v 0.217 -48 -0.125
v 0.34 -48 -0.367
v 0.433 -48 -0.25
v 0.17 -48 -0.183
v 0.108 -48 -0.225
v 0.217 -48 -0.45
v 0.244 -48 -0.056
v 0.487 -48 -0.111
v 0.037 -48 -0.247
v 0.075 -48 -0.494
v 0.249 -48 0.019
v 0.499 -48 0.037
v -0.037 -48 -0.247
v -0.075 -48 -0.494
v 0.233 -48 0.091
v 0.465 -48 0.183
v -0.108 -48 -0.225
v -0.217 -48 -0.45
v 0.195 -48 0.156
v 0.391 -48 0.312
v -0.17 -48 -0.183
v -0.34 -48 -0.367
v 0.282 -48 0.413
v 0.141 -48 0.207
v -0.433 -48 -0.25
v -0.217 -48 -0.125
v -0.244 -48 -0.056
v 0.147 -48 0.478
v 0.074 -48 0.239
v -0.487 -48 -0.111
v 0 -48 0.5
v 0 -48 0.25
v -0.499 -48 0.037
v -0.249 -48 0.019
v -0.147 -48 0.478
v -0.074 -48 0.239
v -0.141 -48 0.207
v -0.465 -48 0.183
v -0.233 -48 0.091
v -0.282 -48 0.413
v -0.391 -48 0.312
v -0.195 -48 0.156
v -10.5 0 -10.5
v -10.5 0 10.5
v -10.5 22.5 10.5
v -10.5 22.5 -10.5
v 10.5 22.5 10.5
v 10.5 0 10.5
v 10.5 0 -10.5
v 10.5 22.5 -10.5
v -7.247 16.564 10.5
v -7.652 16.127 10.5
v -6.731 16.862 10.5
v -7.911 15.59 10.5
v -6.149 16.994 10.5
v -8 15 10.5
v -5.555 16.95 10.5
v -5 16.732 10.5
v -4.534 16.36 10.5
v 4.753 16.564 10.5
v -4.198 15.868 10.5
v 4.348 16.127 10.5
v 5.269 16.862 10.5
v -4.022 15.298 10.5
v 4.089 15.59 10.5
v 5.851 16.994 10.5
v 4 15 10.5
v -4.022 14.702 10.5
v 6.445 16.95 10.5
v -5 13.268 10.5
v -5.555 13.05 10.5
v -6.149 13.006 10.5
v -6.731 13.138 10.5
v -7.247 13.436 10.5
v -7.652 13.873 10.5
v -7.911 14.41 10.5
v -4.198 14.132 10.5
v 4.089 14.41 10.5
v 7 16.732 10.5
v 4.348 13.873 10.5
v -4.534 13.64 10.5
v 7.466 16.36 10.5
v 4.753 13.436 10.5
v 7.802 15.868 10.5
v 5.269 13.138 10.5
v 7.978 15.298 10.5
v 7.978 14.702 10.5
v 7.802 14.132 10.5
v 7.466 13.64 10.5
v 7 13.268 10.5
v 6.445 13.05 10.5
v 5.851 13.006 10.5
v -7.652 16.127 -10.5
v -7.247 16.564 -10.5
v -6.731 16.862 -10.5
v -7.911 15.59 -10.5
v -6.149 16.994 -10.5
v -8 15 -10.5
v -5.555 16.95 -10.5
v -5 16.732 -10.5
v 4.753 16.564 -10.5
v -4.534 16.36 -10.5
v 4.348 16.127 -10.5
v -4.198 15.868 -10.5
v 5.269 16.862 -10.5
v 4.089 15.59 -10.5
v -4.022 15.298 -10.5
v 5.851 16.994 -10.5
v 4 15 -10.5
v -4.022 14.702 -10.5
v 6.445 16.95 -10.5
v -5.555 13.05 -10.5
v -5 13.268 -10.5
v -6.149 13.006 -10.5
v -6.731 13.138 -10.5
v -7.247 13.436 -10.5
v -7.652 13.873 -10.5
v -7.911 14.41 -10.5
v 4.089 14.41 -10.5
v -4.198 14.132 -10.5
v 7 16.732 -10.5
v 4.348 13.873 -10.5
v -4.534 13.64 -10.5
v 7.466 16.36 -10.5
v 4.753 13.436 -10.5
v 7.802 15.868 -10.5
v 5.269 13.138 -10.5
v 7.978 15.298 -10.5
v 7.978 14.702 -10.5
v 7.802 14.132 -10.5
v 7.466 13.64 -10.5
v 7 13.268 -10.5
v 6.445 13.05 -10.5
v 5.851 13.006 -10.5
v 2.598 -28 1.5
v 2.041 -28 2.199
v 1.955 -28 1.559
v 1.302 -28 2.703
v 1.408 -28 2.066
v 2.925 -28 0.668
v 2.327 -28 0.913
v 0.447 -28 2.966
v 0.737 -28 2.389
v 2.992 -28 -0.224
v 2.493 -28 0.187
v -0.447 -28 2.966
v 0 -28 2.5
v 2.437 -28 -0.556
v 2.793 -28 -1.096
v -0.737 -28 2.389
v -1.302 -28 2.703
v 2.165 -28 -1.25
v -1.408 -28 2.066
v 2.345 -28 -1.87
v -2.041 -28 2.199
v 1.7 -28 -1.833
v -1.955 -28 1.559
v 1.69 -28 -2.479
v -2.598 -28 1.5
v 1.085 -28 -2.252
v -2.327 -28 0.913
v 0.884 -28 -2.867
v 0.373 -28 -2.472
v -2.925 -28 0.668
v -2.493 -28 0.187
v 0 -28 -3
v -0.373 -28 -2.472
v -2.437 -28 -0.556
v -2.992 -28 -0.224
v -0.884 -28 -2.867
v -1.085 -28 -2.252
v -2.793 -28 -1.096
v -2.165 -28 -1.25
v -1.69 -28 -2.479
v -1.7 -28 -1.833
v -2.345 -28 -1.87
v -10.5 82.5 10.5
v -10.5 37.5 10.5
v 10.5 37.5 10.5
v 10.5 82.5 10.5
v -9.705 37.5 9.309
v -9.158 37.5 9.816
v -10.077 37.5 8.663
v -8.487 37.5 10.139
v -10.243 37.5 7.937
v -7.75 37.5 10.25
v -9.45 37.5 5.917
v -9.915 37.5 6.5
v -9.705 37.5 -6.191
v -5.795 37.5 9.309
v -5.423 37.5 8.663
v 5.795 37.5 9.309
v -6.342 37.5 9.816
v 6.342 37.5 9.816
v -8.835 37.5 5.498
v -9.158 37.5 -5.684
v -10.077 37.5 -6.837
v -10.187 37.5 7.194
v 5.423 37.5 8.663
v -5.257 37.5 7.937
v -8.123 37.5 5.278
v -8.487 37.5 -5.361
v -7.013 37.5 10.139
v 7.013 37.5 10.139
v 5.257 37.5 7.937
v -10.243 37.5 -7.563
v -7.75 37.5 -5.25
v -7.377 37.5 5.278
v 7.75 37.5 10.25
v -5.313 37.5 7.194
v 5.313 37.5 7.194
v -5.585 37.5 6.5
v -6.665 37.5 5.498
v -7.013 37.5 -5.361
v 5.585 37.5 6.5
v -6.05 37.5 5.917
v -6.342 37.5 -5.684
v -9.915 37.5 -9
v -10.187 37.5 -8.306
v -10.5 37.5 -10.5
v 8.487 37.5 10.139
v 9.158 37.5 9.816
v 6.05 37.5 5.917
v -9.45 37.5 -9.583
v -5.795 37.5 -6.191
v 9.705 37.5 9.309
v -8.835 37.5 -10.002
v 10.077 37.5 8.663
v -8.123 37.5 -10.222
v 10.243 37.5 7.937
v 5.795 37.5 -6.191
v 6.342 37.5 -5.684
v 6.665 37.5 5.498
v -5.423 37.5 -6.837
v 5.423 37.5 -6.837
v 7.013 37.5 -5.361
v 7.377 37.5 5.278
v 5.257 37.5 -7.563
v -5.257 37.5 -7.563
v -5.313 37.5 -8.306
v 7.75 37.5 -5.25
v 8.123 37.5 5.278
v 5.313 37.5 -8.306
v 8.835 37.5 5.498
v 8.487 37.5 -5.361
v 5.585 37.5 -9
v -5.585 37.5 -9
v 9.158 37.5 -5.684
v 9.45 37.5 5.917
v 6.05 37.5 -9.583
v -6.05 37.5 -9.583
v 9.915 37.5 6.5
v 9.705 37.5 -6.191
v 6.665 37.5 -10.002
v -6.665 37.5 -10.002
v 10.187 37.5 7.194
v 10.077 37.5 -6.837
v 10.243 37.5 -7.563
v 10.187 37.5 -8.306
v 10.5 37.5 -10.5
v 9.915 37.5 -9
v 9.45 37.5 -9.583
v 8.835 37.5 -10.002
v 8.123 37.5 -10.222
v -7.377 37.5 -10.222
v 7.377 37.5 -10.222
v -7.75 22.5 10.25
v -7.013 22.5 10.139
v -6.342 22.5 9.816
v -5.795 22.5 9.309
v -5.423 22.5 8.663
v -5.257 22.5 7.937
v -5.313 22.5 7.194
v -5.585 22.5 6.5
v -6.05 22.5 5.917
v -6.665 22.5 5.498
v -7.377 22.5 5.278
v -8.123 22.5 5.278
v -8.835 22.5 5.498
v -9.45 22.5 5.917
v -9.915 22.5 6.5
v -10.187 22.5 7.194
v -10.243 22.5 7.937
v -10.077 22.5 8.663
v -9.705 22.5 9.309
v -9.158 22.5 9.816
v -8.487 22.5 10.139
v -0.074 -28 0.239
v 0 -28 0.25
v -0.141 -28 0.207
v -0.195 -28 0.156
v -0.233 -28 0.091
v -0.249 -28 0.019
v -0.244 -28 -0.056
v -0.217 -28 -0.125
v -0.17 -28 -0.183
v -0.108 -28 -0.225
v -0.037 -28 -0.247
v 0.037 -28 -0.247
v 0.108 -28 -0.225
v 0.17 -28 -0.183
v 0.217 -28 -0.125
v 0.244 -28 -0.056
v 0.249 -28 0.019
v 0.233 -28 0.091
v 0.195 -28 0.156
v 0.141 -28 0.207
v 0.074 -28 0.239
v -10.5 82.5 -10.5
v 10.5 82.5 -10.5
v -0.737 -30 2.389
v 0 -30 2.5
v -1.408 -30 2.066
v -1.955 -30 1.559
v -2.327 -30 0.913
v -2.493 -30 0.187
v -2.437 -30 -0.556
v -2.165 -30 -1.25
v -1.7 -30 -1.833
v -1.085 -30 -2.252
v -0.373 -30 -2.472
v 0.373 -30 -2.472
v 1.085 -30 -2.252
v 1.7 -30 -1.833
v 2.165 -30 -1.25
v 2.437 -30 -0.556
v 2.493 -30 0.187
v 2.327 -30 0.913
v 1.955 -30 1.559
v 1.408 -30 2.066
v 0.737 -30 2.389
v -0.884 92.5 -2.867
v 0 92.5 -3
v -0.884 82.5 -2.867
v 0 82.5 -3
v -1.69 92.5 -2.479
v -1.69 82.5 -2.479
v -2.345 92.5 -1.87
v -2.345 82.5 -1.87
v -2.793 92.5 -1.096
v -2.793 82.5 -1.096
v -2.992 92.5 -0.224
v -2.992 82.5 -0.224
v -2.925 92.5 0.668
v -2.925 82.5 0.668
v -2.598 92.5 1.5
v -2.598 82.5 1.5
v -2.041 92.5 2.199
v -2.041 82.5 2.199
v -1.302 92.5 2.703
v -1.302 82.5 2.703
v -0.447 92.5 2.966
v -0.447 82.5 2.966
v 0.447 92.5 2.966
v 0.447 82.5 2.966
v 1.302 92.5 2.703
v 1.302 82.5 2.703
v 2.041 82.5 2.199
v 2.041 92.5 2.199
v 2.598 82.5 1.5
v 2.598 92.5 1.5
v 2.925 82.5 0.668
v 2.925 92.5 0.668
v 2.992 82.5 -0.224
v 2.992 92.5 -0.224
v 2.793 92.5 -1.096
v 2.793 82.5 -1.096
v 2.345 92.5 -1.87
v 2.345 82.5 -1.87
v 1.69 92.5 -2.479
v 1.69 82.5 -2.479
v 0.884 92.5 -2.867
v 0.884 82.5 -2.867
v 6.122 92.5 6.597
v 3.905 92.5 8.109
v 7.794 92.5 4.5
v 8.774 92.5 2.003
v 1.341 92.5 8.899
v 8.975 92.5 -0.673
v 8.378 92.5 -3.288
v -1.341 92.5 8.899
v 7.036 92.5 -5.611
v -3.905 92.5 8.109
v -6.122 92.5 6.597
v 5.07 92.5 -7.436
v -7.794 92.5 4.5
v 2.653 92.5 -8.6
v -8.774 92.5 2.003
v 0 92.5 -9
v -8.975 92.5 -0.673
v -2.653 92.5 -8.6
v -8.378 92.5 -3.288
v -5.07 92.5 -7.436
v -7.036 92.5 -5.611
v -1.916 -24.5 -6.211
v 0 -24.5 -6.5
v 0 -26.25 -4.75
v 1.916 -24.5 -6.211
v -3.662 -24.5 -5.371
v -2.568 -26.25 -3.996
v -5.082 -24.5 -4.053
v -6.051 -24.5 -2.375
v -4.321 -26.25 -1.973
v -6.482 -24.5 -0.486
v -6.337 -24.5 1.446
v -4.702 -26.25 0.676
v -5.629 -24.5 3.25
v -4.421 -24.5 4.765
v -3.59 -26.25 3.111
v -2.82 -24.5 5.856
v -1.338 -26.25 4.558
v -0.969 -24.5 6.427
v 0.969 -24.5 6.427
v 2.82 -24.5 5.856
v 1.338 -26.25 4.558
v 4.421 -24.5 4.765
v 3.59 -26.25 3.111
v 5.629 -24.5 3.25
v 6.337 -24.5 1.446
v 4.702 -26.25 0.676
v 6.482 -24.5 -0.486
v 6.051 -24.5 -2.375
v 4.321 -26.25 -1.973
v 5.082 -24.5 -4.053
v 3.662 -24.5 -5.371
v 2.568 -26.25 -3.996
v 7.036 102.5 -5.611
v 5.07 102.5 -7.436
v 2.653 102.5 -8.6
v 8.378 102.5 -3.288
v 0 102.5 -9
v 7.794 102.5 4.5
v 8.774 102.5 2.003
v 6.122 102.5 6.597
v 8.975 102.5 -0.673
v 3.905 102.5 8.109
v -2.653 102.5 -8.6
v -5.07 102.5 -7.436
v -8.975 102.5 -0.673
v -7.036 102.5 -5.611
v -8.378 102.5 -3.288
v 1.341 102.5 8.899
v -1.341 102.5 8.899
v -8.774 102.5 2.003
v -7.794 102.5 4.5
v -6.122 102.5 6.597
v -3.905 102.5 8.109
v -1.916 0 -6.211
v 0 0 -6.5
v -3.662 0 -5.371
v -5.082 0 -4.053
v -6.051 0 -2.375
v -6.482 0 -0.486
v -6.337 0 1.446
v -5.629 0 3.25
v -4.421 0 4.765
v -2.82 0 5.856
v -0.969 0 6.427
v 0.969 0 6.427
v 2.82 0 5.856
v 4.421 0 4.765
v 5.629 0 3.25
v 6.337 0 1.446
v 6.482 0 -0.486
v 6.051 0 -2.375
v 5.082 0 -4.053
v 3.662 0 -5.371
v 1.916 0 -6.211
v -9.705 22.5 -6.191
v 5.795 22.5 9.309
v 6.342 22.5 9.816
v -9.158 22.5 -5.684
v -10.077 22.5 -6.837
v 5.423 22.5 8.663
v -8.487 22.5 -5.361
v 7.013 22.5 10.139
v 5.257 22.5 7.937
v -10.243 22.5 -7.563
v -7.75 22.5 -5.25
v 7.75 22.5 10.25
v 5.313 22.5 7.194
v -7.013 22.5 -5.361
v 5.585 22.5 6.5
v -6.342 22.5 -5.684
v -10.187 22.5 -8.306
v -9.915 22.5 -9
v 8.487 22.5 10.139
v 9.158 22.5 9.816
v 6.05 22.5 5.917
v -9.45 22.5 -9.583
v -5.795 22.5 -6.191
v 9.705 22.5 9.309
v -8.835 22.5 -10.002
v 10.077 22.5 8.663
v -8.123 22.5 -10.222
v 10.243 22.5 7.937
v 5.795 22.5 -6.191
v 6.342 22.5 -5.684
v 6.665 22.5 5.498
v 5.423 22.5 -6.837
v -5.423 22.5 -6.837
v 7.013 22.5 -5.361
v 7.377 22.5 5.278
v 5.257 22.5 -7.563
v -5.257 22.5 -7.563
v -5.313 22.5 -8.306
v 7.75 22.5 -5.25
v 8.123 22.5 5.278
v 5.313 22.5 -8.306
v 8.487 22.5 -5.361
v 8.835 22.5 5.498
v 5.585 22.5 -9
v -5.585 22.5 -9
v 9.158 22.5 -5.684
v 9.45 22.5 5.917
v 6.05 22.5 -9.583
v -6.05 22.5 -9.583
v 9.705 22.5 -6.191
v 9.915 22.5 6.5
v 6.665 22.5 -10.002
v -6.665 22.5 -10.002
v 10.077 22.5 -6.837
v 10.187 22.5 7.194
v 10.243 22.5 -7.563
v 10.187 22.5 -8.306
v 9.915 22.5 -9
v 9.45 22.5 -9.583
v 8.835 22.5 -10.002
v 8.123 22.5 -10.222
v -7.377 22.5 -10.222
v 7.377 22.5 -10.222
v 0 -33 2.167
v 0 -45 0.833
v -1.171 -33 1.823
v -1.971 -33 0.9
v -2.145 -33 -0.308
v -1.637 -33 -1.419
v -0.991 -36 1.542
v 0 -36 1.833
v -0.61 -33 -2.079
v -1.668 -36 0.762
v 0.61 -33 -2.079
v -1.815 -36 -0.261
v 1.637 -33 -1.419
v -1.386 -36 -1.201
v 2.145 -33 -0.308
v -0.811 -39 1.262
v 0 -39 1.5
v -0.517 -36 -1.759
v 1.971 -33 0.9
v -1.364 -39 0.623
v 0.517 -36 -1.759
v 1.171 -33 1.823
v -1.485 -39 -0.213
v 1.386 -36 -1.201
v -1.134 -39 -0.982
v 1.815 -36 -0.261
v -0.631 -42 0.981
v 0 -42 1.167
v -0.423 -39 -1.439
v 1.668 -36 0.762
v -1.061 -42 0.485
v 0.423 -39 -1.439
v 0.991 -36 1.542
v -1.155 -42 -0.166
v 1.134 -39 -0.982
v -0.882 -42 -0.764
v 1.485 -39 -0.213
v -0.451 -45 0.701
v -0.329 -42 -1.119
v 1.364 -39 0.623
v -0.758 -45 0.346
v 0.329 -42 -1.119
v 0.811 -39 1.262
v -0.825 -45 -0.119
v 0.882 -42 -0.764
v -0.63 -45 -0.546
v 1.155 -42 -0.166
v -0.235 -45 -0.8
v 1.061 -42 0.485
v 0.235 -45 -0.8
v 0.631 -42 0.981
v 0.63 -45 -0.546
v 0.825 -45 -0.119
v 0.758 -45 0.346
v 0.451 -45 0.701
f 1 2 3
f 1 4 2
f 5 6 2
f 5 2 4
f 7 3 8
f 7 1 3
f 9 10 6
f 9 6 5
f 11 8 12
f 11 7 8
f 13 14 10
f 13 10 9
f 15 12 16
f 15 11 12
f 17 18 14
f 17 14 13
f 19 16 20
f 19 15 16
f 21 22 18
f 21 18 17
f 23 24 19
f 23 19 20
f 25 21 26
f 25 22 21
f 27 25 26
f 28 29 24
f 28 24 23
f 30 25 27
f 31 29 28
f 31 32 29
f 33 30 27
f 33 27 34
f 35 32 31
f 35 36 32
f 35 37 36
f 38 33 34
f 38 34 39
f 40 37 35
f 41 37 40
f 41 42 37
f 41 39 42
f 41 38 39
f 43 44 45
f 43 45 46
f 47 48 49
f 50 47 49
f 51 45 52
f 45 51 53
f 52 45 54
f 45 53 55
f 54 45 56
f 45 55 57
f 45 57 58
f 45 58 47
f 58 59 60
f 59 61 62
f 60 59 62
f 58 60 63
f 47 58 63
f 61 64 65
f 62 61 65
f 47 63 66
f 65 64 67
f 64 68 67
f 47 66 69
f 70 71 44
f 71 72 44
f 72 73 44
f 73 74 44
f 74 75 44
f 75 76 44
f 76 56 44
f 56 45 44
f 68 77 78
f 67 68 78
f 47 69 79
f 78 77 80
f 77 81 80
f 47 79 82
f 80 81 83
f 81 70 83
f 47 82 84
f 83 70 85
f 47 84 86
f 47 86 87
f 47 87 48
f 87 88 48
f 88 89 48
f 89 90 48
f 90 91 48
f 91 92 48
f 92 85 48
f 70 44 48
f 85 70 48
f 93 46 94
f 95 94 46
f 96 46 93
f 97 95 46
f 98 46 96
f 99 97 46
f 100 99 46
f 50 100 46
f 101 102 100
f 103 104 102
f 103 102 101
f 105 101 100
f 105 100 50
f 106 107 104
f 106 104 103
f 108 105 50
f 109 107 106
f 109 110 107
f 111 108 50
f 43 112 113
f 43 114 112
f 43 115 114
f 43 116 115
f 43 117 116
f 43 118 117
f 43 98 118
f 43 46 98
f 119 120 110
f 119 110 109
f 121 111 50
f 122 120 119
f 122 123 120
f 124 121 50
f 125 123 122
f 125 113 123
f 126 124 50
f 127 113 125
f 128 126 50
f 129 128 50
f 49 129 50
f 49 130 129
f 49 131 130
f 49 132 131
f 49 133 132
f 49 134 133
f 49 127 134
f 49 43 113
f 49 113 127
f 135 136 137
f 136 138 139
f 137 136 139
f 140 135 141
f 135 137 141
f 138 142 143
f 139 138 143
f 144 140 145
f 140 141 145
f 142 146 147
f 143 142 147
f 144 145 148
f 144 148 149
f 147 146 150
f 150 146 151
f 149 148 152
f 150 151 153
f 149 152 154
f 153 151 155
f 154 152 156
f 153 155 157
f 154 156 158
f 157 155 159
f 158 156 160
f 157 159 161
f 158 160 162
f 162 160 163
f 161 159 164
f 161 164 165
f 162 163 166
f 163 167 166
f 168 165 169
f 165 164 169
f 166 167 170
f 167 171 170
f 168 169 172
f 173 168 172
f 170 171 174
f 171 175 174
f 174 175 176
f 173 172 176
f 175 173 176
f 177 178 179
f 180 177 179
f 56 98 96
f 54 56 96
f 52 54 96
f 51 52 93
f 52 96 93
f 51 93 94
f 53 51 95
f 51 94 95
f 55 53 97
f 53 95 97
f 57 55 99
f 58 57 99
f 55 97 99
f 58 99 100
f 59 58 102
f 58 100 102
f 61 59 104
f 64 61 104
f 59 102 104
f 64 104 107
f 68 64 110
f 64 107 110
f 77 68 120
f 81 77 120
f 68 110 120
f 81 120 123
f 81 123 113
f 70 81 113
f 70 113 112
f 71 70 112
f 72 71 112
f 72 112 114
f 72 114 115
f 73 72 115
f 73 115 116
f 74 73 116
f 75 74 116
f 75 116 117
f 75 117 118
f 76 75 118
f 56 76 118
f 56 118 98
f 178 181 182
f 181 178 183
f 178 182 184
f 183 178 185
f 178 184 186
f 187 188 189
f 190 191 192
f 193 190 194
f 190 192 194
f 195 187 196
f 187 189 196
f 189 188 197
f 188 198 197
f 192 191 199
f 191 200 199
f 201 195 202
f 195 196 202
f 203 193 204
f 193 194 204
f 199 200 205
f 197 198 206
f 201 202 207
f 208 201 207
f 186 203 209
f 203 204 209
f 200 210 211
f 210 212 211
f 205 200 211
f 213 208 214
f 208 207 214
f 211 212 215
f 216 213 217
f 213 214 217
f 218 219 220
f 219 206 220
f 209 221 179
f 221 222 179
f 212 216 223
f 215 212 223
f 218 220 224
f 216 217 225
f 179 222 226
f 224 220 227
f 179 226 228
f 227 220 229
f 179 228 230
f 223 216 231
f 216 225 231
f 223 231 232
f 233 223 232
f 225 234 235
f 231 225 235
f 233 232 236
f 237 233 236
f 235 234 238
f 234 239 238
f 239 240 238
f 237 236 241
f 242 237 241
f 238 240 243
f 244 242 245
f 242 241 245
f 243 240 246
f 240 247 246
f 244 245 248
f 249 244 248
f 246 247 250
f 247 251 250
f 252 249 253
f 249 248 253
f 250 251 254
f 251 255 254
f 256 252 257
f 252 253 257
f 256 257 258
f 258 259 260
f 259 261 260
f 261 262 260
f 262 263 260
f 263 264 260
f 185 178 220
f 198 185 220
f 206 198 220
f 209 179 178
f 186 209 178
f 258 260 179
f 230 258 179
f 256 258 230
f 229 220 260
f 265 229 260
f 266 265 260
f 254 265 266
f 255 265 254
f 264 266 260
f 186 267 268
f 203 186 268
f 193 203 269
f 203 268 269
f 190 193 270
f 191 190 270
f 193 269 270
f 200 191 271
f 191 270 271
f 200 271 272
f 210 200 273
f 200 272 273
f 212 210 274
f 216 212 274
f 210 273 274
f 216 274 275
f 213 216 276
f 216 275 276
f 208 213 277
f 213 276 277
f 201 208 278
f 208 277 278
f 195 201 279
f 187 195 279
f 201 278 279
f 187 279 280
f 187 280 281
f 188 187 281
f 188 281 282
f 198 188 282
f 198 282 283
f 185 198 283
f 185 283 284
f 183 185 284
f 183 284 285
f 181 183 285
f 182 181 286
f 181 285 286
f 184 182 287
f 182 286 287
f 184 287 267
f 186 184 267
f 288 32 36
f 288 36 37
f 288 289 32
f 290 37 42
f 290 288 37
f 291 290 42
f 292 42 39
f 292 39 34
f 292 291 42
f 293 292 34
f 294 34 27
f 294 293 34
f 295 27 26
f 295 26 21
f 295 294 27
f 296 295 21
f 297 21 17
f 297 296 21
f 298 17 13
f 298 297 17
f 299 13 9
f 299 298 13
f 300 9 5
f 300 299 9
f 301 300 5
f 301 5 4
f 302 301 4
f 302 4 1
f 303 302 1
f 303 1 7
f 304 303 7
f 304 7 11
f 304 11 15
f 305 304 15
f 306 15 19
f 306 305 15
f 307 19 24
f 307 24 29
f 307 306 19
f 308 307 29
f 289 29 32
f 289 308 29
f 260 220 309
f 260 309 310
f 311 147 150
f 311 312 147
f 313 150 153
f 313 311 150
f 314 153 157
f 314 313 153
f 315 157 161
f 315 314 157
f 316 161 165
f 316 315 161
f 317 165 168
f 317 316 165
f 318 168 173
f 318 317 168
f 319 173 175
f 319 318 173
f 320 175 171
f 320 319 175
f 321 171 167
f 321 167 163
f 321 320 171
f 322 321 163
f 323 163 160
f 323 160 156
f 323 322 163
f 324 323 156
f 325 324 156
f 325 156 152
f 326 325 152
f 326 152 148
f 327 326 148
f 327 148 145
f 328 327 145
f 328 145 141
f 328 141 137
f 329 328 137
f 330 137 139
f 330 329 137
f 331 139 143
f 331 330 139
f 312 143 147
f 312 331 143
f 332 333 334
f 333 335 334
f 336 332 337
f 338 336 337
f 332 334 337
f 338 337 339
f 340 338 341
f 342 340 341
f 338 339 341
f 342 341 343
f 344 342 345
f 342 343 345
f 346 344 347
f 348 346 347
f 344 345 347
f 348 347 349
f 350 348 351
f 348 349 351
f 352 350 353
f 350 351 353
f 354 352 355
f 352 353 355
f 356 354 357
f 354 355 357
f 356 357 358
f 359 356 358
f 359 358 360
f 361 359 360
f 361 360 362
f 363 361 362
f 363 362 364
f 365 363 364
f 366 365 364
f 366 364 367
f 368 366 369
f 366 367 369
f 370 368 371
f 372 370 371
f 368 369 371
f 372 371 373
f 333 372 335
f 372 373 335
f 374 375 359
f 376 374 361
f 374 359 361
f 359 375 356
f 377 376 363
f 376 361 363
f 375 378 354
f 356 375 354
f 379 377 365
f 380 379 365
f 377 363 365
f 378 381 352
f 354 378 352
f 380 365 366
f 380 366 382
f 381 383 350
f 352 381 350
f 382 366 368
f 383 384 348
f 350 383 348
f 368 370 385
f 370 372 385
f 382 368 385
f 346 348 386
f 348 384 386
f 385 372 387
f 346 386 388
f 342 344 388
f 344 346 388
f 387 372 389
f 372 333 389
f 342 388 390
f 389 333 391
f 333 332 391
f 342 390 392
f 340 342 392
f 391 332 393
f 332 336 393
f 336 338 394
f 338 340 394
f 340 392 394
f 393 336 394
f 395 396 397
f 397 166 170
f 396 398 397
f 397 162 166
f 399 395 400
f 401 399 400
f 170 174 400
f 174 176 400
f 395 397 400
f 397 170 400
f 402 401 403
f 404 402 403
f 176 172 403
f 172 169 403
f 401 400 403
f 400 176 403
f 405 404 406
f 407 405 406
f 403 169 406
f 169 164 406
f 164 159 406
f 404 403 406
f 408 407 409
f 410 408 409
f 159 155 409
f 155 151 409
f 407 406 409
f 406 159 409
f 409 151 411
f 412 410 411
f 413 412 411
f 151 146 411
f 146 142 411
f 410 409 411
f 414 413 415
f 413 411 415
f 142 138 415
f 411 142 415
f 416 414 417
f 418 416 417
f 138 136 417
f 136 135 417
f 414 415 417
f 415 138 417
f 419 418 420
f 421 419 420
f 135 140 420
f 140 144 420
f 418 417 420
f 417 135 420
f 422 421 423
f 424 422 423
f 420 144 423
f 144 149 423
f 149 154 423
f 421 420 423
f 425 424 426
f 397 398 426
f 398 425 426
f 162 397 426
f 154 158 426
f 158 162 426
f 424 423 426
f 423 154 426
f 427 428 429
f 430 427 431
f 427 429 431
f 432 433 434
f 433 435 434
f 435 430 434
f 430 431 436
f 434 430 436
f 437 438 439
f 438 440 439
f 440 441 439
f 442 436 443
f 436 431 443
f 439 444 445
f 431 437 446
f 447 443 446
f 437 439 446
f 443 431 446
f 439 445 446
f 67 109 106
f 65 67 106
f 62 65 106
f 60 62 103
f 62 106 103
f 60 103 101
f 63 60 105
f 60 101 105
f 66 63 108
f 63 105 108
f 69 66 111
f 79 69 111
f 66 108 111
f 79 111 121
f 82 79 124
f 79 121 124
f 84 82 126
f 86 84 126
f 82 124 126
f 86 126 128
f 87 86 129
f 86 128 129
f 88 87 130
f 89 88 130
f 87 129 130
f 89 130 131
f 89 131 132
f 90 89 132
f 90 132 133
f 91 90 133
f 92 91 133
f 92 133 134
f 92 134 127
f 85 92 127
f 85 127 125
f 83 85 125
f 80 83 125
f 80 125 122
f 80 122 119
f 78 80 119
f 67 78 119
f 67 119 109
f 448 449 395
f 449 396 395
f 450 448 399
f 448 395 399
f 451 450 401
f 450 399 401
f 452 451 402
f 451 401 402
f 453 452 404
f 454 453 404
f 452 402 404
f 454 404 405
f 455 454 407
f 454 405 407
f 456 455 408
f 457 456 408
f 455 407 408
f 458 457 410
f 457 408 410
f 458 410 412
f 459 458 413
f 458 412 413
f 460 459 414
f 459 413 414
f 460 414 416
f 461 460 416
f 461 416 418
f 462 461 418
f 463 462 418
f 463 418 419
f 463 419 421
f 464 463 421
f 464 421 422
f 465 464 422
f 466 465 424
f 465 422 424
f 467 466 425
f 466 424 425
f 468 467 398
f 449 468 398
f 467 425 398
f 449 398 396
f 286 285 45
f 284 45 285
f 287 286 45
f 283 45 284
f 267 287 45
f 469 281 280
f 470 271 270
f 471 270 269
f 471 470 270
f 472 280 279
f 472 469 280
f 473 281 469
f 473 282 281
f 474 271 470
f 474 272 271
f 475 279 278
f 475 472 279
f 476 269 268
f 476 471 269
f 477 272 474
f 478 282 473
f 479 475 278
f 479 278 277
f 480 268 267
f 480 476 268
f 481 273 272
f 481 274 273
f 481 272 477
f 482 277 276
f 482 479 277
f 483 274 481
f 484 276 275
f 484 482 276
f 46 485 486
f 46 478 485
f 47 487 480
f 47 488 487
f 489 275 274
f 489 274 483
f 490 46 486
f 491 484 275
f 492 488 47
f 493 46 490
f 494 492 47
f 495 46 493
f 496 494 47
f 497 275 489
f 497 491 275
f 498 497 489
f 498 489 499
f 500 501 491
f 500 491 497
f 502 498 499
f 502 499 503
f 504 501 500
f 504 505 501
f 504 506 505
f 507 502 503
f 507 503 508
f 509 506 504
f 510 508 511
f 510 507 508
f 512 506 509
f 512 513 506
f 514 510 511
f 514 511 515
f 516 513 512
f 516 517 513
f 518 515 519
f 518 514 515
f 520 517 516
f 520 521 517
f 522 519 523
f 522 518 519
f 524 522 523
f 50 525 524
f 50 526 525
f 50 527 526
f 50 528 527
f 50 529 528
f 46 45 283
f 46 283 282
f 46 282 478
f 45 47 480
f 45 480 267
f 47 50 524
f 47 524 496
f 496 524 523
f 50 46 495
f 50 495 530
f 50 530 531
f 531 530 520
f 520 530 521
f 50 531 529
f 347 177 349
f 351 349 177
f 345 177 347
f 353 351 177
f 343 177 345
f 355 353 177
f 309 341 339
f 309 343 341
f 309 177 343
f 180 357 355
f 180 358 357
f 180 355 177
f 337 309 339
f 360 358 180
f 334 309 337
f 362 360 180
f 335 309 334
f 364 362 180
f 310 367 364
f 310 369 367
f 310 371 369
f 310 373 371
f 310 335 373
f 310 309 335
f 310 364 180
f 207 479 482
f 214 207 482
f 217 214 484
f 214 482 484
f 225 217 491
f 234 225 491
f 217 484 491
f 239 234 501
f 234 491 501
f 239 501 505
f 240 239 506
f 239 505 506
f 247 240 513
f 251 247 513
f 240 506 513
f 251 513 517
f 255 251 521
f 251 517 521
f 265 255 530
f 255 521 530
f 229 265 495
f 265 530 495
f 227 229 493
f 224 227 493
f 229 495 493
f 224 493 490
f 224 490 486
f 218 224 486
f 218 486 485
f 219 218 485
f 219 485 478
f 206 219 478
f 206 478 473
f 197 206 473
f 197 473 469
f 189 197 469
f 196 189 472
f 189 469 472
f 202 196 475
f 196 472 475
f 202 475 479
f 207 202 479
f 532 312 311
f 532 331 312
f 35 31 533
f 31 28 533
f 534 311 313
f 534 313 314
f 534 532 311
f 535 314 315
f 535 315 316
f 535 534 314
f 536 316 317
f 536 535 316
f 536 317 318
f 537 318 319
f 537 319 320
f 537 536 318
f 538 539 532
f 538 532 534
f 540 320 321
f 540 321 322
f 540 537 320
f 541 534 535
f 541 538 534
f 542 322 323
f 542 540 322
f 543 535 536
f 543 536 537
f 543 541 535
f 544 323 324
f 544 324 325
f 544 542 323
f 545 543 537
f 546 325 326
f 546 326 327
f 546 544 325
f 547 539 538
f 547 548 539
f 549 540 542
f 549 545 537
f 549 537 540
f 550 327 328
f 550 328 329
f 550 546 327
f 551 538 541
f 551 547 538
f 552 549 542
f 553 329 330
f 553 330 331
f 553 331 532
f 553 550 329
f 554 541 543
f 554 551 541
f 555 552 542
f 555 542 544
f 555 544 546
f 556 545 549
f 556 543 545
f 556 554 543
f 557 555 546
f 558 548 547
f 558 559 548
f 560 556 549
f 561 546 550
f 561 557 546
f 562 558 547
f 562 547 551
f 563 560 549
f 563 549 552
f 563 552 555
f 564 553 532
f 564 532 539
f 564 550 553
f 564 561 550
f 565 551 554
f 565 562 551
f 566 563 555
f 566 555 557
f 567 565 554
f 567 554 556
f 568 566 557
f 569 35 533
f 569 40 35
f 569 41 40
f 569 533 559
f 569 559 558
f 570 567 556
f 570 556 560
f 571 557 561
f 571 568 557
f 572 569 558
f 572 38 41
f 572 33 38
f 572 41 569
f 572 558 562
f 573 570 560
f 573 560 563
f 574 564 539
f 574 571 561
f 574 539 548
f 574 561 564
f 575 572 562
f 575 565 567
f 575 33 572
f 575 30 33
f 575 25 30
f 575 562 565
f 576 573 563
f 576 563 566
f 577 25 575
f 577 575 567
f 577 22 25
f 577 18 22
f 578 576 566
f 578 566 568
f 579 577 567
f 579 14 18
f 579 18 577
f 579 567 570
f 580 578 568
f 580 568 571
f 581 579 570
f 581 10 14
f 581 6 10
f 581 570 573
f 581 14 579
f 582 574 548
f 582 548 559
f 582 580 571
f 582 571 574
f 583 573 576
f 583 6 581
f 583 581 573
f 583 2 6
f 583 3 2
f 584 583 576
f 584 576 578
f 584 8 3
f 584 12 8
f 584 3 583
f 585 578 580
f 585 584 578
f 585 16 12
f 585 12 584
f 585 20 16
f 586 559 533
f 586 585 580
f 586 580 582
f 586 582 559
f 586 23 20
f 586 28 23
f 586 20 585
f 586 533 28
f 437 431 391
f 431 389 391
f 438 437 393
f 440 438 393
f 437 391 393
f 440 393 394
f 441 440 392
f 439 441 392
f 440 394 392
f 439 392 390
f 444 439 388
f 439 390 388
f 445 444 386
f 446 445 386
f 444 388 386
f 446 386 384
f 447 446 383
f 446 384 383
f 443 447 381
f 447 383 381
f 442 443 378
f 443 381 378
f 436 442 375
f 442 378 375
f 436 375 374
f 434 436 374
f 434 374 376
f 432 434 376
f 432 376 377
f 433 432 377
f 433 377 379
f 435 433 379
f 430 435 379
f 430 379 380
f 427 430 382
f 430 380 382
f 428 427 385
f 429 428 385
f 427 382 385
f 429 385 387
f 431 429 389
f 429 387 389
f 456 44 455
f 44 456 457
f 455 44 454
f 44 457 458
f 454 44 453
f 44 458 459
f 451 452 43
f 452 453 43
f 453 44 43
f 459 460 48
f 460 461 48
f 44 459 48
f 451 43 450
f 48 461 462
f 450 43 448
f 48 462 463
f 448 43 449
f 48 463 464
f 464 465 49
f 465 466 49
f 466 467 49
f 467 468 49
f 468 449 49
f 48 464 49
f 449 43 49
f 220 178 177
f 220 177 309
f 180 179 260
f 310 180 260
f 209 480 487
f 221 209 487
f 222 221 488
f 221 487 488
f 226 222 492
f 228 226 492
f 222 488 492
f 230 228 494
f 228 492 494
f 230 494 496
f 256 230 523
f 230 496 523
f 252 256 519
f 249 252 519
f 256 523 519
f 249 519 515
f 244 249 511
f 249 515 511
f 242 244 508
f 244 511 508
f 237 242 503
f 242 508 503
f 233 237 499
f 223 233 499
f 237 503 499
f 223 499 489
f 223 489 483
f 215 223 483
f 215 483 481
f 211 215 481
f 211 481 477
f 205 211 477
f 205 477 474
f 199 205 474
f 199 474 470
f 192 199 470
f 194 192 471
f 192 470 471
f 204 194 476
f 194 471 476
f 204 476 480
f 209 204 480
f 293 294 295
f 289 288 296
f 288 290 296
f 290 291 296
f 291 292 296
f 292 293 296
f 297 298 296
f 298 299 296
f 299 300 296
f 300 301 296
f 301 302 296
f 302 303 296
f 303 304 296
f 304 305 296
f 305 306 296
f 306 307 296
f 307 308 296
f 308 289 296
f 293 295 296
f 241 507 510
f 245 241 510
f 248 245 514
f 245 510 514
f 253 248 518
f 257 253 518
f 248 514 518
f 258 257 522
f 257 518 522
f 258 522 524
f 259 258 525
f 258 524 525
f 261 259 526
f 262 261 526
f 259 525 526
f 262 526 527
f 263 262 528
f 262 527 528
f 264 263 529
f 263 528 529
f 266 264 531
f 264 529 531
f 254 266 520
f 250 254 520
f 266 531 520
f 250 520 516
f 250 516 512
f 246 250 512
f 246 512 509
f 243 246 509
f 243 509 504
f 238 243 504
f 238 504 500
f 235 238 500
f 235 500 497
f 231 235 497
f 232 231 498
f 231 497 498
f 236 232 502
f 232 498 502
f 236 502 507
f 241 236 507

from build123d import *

# Parameters (mm, degrees)
SKETCH_1_W            = 21
SKETCH_1_H            = 21
EXTRUDE_279_DEPTH     = 22.5
HOLE_WIZARD_4_0_4_1_D = 4
SKETCH_9_R            = 2.5
EXTRUDE_1_DEPTH       = 15
SKETCH_10_W           = 21
SKETCH_10_H           = 21
EXTRUDE_2_DEPTH       = 45


with BuildPart() as part:
    # Эскиз1 → Extrude 279 (new body)
    with BuildSketch(Plane(origin=(0, 0, 0), x_dir=(1, 0, 0), z_dir=(0, 1, 0))):
        Rectangle(SKETCH_1_W, SKETCH_1_H)
    extrude(amount=EXTRUDE_279_DEPTH)

    # Эскиз2 → Повернуть1 (revolve)
    with BuildSketch(Plane.XY, mode=Mode.PRIVATE) as revolve_1_sk:
        Polygon((0, 0), (6.5, 0), (6.5, -24.5), (3, -28), (0, -28), align=None)
    revolve(revolve_1_sk.sketch.rotate(Axis((0, -28, 0), (0, 1, 0)), 90), axis=Axis((0, -28, 0), (0, 1, 0)))

    # Диаметр отверстия Ø4.0 (4)1 (through all)
    with Locations(Plane.XY.offset(10.5)):
        with Locations((-6, 15), (6, 15)):
            Hole(HOLE_WIZARD_4_0_4_1_D / 2)

    # Эскиз8 → Повернуть4 (revolve)
    with BuildSketch(Plane.XY, mode=Mode.PRIVATE) as revolve_4_sk:
        Polygon((0.25, -28), (2.5, -28), (2.5, -30), (0.5, -48), (0.25, -48), align=None)
    revolve(revolve_4_sk.sketch.rotate(Axis((0, -28, 0), (0, -1, 0)), 90), axis=Axis((0, -28, 0), (0, -1, 0)))

    # Эскиз9 → Бобышка-Вытянуть1 (add)
    with BuildSketch(Plane(origin=(0, 22.5, 0), x_dir=(1, 0, 0), z_dir=(0, 1, 0))):
        with Locations(Location((-7.75, 7.75, 0), (0, 0, 270))):
            Circle(SKETCH_9_R)
        with Locations(Location((7.75, 7.75, 0), (0, 0, 270))):
            Circle(SKETCH_9_R)
        with Locations(Location((7.75, -7.75, 0), (0, 0, 270))):
            Circle(SKETCH_9_R)
        with Locations(Location((-7.75, -7.75, 0), (0, 0, 270))):
            Circle(SKETCH_9_R)
    extrude(amount=EXTRUDE_1_DEPTH)

    # Эскиз10 → Бобышка-Вытянуть2 (add)
    with BuildSketch(Plane(origin=(0, 37.5, 0), x_dir=(1, 0, 0), z_dir=(0, 1, 0))):
        Rectangle(SKETCH_10_W, SKETCH_10_H)
    extrude(amount=EXTRUDE_2_DEPTH)

    # Эскиз7 → Повернуть3 (revolve)
    with BuildSketch(Plane.XY, mode=Mode.PRIVATE) as revolve_3_sk:
        Polygon((0, 82.5), (0, 102.5), (9, 102.5), (9, 92.5), (3, 92.5), (3, 82.5), align=None)
    revolve(revolve_3_sk.sketch.rotate(Axis((0, 82.5, 0), (0, 1, 0)), 90), axis=Axis((0, 82.5, 0), (0, 1, 0)))


solid = part.part
